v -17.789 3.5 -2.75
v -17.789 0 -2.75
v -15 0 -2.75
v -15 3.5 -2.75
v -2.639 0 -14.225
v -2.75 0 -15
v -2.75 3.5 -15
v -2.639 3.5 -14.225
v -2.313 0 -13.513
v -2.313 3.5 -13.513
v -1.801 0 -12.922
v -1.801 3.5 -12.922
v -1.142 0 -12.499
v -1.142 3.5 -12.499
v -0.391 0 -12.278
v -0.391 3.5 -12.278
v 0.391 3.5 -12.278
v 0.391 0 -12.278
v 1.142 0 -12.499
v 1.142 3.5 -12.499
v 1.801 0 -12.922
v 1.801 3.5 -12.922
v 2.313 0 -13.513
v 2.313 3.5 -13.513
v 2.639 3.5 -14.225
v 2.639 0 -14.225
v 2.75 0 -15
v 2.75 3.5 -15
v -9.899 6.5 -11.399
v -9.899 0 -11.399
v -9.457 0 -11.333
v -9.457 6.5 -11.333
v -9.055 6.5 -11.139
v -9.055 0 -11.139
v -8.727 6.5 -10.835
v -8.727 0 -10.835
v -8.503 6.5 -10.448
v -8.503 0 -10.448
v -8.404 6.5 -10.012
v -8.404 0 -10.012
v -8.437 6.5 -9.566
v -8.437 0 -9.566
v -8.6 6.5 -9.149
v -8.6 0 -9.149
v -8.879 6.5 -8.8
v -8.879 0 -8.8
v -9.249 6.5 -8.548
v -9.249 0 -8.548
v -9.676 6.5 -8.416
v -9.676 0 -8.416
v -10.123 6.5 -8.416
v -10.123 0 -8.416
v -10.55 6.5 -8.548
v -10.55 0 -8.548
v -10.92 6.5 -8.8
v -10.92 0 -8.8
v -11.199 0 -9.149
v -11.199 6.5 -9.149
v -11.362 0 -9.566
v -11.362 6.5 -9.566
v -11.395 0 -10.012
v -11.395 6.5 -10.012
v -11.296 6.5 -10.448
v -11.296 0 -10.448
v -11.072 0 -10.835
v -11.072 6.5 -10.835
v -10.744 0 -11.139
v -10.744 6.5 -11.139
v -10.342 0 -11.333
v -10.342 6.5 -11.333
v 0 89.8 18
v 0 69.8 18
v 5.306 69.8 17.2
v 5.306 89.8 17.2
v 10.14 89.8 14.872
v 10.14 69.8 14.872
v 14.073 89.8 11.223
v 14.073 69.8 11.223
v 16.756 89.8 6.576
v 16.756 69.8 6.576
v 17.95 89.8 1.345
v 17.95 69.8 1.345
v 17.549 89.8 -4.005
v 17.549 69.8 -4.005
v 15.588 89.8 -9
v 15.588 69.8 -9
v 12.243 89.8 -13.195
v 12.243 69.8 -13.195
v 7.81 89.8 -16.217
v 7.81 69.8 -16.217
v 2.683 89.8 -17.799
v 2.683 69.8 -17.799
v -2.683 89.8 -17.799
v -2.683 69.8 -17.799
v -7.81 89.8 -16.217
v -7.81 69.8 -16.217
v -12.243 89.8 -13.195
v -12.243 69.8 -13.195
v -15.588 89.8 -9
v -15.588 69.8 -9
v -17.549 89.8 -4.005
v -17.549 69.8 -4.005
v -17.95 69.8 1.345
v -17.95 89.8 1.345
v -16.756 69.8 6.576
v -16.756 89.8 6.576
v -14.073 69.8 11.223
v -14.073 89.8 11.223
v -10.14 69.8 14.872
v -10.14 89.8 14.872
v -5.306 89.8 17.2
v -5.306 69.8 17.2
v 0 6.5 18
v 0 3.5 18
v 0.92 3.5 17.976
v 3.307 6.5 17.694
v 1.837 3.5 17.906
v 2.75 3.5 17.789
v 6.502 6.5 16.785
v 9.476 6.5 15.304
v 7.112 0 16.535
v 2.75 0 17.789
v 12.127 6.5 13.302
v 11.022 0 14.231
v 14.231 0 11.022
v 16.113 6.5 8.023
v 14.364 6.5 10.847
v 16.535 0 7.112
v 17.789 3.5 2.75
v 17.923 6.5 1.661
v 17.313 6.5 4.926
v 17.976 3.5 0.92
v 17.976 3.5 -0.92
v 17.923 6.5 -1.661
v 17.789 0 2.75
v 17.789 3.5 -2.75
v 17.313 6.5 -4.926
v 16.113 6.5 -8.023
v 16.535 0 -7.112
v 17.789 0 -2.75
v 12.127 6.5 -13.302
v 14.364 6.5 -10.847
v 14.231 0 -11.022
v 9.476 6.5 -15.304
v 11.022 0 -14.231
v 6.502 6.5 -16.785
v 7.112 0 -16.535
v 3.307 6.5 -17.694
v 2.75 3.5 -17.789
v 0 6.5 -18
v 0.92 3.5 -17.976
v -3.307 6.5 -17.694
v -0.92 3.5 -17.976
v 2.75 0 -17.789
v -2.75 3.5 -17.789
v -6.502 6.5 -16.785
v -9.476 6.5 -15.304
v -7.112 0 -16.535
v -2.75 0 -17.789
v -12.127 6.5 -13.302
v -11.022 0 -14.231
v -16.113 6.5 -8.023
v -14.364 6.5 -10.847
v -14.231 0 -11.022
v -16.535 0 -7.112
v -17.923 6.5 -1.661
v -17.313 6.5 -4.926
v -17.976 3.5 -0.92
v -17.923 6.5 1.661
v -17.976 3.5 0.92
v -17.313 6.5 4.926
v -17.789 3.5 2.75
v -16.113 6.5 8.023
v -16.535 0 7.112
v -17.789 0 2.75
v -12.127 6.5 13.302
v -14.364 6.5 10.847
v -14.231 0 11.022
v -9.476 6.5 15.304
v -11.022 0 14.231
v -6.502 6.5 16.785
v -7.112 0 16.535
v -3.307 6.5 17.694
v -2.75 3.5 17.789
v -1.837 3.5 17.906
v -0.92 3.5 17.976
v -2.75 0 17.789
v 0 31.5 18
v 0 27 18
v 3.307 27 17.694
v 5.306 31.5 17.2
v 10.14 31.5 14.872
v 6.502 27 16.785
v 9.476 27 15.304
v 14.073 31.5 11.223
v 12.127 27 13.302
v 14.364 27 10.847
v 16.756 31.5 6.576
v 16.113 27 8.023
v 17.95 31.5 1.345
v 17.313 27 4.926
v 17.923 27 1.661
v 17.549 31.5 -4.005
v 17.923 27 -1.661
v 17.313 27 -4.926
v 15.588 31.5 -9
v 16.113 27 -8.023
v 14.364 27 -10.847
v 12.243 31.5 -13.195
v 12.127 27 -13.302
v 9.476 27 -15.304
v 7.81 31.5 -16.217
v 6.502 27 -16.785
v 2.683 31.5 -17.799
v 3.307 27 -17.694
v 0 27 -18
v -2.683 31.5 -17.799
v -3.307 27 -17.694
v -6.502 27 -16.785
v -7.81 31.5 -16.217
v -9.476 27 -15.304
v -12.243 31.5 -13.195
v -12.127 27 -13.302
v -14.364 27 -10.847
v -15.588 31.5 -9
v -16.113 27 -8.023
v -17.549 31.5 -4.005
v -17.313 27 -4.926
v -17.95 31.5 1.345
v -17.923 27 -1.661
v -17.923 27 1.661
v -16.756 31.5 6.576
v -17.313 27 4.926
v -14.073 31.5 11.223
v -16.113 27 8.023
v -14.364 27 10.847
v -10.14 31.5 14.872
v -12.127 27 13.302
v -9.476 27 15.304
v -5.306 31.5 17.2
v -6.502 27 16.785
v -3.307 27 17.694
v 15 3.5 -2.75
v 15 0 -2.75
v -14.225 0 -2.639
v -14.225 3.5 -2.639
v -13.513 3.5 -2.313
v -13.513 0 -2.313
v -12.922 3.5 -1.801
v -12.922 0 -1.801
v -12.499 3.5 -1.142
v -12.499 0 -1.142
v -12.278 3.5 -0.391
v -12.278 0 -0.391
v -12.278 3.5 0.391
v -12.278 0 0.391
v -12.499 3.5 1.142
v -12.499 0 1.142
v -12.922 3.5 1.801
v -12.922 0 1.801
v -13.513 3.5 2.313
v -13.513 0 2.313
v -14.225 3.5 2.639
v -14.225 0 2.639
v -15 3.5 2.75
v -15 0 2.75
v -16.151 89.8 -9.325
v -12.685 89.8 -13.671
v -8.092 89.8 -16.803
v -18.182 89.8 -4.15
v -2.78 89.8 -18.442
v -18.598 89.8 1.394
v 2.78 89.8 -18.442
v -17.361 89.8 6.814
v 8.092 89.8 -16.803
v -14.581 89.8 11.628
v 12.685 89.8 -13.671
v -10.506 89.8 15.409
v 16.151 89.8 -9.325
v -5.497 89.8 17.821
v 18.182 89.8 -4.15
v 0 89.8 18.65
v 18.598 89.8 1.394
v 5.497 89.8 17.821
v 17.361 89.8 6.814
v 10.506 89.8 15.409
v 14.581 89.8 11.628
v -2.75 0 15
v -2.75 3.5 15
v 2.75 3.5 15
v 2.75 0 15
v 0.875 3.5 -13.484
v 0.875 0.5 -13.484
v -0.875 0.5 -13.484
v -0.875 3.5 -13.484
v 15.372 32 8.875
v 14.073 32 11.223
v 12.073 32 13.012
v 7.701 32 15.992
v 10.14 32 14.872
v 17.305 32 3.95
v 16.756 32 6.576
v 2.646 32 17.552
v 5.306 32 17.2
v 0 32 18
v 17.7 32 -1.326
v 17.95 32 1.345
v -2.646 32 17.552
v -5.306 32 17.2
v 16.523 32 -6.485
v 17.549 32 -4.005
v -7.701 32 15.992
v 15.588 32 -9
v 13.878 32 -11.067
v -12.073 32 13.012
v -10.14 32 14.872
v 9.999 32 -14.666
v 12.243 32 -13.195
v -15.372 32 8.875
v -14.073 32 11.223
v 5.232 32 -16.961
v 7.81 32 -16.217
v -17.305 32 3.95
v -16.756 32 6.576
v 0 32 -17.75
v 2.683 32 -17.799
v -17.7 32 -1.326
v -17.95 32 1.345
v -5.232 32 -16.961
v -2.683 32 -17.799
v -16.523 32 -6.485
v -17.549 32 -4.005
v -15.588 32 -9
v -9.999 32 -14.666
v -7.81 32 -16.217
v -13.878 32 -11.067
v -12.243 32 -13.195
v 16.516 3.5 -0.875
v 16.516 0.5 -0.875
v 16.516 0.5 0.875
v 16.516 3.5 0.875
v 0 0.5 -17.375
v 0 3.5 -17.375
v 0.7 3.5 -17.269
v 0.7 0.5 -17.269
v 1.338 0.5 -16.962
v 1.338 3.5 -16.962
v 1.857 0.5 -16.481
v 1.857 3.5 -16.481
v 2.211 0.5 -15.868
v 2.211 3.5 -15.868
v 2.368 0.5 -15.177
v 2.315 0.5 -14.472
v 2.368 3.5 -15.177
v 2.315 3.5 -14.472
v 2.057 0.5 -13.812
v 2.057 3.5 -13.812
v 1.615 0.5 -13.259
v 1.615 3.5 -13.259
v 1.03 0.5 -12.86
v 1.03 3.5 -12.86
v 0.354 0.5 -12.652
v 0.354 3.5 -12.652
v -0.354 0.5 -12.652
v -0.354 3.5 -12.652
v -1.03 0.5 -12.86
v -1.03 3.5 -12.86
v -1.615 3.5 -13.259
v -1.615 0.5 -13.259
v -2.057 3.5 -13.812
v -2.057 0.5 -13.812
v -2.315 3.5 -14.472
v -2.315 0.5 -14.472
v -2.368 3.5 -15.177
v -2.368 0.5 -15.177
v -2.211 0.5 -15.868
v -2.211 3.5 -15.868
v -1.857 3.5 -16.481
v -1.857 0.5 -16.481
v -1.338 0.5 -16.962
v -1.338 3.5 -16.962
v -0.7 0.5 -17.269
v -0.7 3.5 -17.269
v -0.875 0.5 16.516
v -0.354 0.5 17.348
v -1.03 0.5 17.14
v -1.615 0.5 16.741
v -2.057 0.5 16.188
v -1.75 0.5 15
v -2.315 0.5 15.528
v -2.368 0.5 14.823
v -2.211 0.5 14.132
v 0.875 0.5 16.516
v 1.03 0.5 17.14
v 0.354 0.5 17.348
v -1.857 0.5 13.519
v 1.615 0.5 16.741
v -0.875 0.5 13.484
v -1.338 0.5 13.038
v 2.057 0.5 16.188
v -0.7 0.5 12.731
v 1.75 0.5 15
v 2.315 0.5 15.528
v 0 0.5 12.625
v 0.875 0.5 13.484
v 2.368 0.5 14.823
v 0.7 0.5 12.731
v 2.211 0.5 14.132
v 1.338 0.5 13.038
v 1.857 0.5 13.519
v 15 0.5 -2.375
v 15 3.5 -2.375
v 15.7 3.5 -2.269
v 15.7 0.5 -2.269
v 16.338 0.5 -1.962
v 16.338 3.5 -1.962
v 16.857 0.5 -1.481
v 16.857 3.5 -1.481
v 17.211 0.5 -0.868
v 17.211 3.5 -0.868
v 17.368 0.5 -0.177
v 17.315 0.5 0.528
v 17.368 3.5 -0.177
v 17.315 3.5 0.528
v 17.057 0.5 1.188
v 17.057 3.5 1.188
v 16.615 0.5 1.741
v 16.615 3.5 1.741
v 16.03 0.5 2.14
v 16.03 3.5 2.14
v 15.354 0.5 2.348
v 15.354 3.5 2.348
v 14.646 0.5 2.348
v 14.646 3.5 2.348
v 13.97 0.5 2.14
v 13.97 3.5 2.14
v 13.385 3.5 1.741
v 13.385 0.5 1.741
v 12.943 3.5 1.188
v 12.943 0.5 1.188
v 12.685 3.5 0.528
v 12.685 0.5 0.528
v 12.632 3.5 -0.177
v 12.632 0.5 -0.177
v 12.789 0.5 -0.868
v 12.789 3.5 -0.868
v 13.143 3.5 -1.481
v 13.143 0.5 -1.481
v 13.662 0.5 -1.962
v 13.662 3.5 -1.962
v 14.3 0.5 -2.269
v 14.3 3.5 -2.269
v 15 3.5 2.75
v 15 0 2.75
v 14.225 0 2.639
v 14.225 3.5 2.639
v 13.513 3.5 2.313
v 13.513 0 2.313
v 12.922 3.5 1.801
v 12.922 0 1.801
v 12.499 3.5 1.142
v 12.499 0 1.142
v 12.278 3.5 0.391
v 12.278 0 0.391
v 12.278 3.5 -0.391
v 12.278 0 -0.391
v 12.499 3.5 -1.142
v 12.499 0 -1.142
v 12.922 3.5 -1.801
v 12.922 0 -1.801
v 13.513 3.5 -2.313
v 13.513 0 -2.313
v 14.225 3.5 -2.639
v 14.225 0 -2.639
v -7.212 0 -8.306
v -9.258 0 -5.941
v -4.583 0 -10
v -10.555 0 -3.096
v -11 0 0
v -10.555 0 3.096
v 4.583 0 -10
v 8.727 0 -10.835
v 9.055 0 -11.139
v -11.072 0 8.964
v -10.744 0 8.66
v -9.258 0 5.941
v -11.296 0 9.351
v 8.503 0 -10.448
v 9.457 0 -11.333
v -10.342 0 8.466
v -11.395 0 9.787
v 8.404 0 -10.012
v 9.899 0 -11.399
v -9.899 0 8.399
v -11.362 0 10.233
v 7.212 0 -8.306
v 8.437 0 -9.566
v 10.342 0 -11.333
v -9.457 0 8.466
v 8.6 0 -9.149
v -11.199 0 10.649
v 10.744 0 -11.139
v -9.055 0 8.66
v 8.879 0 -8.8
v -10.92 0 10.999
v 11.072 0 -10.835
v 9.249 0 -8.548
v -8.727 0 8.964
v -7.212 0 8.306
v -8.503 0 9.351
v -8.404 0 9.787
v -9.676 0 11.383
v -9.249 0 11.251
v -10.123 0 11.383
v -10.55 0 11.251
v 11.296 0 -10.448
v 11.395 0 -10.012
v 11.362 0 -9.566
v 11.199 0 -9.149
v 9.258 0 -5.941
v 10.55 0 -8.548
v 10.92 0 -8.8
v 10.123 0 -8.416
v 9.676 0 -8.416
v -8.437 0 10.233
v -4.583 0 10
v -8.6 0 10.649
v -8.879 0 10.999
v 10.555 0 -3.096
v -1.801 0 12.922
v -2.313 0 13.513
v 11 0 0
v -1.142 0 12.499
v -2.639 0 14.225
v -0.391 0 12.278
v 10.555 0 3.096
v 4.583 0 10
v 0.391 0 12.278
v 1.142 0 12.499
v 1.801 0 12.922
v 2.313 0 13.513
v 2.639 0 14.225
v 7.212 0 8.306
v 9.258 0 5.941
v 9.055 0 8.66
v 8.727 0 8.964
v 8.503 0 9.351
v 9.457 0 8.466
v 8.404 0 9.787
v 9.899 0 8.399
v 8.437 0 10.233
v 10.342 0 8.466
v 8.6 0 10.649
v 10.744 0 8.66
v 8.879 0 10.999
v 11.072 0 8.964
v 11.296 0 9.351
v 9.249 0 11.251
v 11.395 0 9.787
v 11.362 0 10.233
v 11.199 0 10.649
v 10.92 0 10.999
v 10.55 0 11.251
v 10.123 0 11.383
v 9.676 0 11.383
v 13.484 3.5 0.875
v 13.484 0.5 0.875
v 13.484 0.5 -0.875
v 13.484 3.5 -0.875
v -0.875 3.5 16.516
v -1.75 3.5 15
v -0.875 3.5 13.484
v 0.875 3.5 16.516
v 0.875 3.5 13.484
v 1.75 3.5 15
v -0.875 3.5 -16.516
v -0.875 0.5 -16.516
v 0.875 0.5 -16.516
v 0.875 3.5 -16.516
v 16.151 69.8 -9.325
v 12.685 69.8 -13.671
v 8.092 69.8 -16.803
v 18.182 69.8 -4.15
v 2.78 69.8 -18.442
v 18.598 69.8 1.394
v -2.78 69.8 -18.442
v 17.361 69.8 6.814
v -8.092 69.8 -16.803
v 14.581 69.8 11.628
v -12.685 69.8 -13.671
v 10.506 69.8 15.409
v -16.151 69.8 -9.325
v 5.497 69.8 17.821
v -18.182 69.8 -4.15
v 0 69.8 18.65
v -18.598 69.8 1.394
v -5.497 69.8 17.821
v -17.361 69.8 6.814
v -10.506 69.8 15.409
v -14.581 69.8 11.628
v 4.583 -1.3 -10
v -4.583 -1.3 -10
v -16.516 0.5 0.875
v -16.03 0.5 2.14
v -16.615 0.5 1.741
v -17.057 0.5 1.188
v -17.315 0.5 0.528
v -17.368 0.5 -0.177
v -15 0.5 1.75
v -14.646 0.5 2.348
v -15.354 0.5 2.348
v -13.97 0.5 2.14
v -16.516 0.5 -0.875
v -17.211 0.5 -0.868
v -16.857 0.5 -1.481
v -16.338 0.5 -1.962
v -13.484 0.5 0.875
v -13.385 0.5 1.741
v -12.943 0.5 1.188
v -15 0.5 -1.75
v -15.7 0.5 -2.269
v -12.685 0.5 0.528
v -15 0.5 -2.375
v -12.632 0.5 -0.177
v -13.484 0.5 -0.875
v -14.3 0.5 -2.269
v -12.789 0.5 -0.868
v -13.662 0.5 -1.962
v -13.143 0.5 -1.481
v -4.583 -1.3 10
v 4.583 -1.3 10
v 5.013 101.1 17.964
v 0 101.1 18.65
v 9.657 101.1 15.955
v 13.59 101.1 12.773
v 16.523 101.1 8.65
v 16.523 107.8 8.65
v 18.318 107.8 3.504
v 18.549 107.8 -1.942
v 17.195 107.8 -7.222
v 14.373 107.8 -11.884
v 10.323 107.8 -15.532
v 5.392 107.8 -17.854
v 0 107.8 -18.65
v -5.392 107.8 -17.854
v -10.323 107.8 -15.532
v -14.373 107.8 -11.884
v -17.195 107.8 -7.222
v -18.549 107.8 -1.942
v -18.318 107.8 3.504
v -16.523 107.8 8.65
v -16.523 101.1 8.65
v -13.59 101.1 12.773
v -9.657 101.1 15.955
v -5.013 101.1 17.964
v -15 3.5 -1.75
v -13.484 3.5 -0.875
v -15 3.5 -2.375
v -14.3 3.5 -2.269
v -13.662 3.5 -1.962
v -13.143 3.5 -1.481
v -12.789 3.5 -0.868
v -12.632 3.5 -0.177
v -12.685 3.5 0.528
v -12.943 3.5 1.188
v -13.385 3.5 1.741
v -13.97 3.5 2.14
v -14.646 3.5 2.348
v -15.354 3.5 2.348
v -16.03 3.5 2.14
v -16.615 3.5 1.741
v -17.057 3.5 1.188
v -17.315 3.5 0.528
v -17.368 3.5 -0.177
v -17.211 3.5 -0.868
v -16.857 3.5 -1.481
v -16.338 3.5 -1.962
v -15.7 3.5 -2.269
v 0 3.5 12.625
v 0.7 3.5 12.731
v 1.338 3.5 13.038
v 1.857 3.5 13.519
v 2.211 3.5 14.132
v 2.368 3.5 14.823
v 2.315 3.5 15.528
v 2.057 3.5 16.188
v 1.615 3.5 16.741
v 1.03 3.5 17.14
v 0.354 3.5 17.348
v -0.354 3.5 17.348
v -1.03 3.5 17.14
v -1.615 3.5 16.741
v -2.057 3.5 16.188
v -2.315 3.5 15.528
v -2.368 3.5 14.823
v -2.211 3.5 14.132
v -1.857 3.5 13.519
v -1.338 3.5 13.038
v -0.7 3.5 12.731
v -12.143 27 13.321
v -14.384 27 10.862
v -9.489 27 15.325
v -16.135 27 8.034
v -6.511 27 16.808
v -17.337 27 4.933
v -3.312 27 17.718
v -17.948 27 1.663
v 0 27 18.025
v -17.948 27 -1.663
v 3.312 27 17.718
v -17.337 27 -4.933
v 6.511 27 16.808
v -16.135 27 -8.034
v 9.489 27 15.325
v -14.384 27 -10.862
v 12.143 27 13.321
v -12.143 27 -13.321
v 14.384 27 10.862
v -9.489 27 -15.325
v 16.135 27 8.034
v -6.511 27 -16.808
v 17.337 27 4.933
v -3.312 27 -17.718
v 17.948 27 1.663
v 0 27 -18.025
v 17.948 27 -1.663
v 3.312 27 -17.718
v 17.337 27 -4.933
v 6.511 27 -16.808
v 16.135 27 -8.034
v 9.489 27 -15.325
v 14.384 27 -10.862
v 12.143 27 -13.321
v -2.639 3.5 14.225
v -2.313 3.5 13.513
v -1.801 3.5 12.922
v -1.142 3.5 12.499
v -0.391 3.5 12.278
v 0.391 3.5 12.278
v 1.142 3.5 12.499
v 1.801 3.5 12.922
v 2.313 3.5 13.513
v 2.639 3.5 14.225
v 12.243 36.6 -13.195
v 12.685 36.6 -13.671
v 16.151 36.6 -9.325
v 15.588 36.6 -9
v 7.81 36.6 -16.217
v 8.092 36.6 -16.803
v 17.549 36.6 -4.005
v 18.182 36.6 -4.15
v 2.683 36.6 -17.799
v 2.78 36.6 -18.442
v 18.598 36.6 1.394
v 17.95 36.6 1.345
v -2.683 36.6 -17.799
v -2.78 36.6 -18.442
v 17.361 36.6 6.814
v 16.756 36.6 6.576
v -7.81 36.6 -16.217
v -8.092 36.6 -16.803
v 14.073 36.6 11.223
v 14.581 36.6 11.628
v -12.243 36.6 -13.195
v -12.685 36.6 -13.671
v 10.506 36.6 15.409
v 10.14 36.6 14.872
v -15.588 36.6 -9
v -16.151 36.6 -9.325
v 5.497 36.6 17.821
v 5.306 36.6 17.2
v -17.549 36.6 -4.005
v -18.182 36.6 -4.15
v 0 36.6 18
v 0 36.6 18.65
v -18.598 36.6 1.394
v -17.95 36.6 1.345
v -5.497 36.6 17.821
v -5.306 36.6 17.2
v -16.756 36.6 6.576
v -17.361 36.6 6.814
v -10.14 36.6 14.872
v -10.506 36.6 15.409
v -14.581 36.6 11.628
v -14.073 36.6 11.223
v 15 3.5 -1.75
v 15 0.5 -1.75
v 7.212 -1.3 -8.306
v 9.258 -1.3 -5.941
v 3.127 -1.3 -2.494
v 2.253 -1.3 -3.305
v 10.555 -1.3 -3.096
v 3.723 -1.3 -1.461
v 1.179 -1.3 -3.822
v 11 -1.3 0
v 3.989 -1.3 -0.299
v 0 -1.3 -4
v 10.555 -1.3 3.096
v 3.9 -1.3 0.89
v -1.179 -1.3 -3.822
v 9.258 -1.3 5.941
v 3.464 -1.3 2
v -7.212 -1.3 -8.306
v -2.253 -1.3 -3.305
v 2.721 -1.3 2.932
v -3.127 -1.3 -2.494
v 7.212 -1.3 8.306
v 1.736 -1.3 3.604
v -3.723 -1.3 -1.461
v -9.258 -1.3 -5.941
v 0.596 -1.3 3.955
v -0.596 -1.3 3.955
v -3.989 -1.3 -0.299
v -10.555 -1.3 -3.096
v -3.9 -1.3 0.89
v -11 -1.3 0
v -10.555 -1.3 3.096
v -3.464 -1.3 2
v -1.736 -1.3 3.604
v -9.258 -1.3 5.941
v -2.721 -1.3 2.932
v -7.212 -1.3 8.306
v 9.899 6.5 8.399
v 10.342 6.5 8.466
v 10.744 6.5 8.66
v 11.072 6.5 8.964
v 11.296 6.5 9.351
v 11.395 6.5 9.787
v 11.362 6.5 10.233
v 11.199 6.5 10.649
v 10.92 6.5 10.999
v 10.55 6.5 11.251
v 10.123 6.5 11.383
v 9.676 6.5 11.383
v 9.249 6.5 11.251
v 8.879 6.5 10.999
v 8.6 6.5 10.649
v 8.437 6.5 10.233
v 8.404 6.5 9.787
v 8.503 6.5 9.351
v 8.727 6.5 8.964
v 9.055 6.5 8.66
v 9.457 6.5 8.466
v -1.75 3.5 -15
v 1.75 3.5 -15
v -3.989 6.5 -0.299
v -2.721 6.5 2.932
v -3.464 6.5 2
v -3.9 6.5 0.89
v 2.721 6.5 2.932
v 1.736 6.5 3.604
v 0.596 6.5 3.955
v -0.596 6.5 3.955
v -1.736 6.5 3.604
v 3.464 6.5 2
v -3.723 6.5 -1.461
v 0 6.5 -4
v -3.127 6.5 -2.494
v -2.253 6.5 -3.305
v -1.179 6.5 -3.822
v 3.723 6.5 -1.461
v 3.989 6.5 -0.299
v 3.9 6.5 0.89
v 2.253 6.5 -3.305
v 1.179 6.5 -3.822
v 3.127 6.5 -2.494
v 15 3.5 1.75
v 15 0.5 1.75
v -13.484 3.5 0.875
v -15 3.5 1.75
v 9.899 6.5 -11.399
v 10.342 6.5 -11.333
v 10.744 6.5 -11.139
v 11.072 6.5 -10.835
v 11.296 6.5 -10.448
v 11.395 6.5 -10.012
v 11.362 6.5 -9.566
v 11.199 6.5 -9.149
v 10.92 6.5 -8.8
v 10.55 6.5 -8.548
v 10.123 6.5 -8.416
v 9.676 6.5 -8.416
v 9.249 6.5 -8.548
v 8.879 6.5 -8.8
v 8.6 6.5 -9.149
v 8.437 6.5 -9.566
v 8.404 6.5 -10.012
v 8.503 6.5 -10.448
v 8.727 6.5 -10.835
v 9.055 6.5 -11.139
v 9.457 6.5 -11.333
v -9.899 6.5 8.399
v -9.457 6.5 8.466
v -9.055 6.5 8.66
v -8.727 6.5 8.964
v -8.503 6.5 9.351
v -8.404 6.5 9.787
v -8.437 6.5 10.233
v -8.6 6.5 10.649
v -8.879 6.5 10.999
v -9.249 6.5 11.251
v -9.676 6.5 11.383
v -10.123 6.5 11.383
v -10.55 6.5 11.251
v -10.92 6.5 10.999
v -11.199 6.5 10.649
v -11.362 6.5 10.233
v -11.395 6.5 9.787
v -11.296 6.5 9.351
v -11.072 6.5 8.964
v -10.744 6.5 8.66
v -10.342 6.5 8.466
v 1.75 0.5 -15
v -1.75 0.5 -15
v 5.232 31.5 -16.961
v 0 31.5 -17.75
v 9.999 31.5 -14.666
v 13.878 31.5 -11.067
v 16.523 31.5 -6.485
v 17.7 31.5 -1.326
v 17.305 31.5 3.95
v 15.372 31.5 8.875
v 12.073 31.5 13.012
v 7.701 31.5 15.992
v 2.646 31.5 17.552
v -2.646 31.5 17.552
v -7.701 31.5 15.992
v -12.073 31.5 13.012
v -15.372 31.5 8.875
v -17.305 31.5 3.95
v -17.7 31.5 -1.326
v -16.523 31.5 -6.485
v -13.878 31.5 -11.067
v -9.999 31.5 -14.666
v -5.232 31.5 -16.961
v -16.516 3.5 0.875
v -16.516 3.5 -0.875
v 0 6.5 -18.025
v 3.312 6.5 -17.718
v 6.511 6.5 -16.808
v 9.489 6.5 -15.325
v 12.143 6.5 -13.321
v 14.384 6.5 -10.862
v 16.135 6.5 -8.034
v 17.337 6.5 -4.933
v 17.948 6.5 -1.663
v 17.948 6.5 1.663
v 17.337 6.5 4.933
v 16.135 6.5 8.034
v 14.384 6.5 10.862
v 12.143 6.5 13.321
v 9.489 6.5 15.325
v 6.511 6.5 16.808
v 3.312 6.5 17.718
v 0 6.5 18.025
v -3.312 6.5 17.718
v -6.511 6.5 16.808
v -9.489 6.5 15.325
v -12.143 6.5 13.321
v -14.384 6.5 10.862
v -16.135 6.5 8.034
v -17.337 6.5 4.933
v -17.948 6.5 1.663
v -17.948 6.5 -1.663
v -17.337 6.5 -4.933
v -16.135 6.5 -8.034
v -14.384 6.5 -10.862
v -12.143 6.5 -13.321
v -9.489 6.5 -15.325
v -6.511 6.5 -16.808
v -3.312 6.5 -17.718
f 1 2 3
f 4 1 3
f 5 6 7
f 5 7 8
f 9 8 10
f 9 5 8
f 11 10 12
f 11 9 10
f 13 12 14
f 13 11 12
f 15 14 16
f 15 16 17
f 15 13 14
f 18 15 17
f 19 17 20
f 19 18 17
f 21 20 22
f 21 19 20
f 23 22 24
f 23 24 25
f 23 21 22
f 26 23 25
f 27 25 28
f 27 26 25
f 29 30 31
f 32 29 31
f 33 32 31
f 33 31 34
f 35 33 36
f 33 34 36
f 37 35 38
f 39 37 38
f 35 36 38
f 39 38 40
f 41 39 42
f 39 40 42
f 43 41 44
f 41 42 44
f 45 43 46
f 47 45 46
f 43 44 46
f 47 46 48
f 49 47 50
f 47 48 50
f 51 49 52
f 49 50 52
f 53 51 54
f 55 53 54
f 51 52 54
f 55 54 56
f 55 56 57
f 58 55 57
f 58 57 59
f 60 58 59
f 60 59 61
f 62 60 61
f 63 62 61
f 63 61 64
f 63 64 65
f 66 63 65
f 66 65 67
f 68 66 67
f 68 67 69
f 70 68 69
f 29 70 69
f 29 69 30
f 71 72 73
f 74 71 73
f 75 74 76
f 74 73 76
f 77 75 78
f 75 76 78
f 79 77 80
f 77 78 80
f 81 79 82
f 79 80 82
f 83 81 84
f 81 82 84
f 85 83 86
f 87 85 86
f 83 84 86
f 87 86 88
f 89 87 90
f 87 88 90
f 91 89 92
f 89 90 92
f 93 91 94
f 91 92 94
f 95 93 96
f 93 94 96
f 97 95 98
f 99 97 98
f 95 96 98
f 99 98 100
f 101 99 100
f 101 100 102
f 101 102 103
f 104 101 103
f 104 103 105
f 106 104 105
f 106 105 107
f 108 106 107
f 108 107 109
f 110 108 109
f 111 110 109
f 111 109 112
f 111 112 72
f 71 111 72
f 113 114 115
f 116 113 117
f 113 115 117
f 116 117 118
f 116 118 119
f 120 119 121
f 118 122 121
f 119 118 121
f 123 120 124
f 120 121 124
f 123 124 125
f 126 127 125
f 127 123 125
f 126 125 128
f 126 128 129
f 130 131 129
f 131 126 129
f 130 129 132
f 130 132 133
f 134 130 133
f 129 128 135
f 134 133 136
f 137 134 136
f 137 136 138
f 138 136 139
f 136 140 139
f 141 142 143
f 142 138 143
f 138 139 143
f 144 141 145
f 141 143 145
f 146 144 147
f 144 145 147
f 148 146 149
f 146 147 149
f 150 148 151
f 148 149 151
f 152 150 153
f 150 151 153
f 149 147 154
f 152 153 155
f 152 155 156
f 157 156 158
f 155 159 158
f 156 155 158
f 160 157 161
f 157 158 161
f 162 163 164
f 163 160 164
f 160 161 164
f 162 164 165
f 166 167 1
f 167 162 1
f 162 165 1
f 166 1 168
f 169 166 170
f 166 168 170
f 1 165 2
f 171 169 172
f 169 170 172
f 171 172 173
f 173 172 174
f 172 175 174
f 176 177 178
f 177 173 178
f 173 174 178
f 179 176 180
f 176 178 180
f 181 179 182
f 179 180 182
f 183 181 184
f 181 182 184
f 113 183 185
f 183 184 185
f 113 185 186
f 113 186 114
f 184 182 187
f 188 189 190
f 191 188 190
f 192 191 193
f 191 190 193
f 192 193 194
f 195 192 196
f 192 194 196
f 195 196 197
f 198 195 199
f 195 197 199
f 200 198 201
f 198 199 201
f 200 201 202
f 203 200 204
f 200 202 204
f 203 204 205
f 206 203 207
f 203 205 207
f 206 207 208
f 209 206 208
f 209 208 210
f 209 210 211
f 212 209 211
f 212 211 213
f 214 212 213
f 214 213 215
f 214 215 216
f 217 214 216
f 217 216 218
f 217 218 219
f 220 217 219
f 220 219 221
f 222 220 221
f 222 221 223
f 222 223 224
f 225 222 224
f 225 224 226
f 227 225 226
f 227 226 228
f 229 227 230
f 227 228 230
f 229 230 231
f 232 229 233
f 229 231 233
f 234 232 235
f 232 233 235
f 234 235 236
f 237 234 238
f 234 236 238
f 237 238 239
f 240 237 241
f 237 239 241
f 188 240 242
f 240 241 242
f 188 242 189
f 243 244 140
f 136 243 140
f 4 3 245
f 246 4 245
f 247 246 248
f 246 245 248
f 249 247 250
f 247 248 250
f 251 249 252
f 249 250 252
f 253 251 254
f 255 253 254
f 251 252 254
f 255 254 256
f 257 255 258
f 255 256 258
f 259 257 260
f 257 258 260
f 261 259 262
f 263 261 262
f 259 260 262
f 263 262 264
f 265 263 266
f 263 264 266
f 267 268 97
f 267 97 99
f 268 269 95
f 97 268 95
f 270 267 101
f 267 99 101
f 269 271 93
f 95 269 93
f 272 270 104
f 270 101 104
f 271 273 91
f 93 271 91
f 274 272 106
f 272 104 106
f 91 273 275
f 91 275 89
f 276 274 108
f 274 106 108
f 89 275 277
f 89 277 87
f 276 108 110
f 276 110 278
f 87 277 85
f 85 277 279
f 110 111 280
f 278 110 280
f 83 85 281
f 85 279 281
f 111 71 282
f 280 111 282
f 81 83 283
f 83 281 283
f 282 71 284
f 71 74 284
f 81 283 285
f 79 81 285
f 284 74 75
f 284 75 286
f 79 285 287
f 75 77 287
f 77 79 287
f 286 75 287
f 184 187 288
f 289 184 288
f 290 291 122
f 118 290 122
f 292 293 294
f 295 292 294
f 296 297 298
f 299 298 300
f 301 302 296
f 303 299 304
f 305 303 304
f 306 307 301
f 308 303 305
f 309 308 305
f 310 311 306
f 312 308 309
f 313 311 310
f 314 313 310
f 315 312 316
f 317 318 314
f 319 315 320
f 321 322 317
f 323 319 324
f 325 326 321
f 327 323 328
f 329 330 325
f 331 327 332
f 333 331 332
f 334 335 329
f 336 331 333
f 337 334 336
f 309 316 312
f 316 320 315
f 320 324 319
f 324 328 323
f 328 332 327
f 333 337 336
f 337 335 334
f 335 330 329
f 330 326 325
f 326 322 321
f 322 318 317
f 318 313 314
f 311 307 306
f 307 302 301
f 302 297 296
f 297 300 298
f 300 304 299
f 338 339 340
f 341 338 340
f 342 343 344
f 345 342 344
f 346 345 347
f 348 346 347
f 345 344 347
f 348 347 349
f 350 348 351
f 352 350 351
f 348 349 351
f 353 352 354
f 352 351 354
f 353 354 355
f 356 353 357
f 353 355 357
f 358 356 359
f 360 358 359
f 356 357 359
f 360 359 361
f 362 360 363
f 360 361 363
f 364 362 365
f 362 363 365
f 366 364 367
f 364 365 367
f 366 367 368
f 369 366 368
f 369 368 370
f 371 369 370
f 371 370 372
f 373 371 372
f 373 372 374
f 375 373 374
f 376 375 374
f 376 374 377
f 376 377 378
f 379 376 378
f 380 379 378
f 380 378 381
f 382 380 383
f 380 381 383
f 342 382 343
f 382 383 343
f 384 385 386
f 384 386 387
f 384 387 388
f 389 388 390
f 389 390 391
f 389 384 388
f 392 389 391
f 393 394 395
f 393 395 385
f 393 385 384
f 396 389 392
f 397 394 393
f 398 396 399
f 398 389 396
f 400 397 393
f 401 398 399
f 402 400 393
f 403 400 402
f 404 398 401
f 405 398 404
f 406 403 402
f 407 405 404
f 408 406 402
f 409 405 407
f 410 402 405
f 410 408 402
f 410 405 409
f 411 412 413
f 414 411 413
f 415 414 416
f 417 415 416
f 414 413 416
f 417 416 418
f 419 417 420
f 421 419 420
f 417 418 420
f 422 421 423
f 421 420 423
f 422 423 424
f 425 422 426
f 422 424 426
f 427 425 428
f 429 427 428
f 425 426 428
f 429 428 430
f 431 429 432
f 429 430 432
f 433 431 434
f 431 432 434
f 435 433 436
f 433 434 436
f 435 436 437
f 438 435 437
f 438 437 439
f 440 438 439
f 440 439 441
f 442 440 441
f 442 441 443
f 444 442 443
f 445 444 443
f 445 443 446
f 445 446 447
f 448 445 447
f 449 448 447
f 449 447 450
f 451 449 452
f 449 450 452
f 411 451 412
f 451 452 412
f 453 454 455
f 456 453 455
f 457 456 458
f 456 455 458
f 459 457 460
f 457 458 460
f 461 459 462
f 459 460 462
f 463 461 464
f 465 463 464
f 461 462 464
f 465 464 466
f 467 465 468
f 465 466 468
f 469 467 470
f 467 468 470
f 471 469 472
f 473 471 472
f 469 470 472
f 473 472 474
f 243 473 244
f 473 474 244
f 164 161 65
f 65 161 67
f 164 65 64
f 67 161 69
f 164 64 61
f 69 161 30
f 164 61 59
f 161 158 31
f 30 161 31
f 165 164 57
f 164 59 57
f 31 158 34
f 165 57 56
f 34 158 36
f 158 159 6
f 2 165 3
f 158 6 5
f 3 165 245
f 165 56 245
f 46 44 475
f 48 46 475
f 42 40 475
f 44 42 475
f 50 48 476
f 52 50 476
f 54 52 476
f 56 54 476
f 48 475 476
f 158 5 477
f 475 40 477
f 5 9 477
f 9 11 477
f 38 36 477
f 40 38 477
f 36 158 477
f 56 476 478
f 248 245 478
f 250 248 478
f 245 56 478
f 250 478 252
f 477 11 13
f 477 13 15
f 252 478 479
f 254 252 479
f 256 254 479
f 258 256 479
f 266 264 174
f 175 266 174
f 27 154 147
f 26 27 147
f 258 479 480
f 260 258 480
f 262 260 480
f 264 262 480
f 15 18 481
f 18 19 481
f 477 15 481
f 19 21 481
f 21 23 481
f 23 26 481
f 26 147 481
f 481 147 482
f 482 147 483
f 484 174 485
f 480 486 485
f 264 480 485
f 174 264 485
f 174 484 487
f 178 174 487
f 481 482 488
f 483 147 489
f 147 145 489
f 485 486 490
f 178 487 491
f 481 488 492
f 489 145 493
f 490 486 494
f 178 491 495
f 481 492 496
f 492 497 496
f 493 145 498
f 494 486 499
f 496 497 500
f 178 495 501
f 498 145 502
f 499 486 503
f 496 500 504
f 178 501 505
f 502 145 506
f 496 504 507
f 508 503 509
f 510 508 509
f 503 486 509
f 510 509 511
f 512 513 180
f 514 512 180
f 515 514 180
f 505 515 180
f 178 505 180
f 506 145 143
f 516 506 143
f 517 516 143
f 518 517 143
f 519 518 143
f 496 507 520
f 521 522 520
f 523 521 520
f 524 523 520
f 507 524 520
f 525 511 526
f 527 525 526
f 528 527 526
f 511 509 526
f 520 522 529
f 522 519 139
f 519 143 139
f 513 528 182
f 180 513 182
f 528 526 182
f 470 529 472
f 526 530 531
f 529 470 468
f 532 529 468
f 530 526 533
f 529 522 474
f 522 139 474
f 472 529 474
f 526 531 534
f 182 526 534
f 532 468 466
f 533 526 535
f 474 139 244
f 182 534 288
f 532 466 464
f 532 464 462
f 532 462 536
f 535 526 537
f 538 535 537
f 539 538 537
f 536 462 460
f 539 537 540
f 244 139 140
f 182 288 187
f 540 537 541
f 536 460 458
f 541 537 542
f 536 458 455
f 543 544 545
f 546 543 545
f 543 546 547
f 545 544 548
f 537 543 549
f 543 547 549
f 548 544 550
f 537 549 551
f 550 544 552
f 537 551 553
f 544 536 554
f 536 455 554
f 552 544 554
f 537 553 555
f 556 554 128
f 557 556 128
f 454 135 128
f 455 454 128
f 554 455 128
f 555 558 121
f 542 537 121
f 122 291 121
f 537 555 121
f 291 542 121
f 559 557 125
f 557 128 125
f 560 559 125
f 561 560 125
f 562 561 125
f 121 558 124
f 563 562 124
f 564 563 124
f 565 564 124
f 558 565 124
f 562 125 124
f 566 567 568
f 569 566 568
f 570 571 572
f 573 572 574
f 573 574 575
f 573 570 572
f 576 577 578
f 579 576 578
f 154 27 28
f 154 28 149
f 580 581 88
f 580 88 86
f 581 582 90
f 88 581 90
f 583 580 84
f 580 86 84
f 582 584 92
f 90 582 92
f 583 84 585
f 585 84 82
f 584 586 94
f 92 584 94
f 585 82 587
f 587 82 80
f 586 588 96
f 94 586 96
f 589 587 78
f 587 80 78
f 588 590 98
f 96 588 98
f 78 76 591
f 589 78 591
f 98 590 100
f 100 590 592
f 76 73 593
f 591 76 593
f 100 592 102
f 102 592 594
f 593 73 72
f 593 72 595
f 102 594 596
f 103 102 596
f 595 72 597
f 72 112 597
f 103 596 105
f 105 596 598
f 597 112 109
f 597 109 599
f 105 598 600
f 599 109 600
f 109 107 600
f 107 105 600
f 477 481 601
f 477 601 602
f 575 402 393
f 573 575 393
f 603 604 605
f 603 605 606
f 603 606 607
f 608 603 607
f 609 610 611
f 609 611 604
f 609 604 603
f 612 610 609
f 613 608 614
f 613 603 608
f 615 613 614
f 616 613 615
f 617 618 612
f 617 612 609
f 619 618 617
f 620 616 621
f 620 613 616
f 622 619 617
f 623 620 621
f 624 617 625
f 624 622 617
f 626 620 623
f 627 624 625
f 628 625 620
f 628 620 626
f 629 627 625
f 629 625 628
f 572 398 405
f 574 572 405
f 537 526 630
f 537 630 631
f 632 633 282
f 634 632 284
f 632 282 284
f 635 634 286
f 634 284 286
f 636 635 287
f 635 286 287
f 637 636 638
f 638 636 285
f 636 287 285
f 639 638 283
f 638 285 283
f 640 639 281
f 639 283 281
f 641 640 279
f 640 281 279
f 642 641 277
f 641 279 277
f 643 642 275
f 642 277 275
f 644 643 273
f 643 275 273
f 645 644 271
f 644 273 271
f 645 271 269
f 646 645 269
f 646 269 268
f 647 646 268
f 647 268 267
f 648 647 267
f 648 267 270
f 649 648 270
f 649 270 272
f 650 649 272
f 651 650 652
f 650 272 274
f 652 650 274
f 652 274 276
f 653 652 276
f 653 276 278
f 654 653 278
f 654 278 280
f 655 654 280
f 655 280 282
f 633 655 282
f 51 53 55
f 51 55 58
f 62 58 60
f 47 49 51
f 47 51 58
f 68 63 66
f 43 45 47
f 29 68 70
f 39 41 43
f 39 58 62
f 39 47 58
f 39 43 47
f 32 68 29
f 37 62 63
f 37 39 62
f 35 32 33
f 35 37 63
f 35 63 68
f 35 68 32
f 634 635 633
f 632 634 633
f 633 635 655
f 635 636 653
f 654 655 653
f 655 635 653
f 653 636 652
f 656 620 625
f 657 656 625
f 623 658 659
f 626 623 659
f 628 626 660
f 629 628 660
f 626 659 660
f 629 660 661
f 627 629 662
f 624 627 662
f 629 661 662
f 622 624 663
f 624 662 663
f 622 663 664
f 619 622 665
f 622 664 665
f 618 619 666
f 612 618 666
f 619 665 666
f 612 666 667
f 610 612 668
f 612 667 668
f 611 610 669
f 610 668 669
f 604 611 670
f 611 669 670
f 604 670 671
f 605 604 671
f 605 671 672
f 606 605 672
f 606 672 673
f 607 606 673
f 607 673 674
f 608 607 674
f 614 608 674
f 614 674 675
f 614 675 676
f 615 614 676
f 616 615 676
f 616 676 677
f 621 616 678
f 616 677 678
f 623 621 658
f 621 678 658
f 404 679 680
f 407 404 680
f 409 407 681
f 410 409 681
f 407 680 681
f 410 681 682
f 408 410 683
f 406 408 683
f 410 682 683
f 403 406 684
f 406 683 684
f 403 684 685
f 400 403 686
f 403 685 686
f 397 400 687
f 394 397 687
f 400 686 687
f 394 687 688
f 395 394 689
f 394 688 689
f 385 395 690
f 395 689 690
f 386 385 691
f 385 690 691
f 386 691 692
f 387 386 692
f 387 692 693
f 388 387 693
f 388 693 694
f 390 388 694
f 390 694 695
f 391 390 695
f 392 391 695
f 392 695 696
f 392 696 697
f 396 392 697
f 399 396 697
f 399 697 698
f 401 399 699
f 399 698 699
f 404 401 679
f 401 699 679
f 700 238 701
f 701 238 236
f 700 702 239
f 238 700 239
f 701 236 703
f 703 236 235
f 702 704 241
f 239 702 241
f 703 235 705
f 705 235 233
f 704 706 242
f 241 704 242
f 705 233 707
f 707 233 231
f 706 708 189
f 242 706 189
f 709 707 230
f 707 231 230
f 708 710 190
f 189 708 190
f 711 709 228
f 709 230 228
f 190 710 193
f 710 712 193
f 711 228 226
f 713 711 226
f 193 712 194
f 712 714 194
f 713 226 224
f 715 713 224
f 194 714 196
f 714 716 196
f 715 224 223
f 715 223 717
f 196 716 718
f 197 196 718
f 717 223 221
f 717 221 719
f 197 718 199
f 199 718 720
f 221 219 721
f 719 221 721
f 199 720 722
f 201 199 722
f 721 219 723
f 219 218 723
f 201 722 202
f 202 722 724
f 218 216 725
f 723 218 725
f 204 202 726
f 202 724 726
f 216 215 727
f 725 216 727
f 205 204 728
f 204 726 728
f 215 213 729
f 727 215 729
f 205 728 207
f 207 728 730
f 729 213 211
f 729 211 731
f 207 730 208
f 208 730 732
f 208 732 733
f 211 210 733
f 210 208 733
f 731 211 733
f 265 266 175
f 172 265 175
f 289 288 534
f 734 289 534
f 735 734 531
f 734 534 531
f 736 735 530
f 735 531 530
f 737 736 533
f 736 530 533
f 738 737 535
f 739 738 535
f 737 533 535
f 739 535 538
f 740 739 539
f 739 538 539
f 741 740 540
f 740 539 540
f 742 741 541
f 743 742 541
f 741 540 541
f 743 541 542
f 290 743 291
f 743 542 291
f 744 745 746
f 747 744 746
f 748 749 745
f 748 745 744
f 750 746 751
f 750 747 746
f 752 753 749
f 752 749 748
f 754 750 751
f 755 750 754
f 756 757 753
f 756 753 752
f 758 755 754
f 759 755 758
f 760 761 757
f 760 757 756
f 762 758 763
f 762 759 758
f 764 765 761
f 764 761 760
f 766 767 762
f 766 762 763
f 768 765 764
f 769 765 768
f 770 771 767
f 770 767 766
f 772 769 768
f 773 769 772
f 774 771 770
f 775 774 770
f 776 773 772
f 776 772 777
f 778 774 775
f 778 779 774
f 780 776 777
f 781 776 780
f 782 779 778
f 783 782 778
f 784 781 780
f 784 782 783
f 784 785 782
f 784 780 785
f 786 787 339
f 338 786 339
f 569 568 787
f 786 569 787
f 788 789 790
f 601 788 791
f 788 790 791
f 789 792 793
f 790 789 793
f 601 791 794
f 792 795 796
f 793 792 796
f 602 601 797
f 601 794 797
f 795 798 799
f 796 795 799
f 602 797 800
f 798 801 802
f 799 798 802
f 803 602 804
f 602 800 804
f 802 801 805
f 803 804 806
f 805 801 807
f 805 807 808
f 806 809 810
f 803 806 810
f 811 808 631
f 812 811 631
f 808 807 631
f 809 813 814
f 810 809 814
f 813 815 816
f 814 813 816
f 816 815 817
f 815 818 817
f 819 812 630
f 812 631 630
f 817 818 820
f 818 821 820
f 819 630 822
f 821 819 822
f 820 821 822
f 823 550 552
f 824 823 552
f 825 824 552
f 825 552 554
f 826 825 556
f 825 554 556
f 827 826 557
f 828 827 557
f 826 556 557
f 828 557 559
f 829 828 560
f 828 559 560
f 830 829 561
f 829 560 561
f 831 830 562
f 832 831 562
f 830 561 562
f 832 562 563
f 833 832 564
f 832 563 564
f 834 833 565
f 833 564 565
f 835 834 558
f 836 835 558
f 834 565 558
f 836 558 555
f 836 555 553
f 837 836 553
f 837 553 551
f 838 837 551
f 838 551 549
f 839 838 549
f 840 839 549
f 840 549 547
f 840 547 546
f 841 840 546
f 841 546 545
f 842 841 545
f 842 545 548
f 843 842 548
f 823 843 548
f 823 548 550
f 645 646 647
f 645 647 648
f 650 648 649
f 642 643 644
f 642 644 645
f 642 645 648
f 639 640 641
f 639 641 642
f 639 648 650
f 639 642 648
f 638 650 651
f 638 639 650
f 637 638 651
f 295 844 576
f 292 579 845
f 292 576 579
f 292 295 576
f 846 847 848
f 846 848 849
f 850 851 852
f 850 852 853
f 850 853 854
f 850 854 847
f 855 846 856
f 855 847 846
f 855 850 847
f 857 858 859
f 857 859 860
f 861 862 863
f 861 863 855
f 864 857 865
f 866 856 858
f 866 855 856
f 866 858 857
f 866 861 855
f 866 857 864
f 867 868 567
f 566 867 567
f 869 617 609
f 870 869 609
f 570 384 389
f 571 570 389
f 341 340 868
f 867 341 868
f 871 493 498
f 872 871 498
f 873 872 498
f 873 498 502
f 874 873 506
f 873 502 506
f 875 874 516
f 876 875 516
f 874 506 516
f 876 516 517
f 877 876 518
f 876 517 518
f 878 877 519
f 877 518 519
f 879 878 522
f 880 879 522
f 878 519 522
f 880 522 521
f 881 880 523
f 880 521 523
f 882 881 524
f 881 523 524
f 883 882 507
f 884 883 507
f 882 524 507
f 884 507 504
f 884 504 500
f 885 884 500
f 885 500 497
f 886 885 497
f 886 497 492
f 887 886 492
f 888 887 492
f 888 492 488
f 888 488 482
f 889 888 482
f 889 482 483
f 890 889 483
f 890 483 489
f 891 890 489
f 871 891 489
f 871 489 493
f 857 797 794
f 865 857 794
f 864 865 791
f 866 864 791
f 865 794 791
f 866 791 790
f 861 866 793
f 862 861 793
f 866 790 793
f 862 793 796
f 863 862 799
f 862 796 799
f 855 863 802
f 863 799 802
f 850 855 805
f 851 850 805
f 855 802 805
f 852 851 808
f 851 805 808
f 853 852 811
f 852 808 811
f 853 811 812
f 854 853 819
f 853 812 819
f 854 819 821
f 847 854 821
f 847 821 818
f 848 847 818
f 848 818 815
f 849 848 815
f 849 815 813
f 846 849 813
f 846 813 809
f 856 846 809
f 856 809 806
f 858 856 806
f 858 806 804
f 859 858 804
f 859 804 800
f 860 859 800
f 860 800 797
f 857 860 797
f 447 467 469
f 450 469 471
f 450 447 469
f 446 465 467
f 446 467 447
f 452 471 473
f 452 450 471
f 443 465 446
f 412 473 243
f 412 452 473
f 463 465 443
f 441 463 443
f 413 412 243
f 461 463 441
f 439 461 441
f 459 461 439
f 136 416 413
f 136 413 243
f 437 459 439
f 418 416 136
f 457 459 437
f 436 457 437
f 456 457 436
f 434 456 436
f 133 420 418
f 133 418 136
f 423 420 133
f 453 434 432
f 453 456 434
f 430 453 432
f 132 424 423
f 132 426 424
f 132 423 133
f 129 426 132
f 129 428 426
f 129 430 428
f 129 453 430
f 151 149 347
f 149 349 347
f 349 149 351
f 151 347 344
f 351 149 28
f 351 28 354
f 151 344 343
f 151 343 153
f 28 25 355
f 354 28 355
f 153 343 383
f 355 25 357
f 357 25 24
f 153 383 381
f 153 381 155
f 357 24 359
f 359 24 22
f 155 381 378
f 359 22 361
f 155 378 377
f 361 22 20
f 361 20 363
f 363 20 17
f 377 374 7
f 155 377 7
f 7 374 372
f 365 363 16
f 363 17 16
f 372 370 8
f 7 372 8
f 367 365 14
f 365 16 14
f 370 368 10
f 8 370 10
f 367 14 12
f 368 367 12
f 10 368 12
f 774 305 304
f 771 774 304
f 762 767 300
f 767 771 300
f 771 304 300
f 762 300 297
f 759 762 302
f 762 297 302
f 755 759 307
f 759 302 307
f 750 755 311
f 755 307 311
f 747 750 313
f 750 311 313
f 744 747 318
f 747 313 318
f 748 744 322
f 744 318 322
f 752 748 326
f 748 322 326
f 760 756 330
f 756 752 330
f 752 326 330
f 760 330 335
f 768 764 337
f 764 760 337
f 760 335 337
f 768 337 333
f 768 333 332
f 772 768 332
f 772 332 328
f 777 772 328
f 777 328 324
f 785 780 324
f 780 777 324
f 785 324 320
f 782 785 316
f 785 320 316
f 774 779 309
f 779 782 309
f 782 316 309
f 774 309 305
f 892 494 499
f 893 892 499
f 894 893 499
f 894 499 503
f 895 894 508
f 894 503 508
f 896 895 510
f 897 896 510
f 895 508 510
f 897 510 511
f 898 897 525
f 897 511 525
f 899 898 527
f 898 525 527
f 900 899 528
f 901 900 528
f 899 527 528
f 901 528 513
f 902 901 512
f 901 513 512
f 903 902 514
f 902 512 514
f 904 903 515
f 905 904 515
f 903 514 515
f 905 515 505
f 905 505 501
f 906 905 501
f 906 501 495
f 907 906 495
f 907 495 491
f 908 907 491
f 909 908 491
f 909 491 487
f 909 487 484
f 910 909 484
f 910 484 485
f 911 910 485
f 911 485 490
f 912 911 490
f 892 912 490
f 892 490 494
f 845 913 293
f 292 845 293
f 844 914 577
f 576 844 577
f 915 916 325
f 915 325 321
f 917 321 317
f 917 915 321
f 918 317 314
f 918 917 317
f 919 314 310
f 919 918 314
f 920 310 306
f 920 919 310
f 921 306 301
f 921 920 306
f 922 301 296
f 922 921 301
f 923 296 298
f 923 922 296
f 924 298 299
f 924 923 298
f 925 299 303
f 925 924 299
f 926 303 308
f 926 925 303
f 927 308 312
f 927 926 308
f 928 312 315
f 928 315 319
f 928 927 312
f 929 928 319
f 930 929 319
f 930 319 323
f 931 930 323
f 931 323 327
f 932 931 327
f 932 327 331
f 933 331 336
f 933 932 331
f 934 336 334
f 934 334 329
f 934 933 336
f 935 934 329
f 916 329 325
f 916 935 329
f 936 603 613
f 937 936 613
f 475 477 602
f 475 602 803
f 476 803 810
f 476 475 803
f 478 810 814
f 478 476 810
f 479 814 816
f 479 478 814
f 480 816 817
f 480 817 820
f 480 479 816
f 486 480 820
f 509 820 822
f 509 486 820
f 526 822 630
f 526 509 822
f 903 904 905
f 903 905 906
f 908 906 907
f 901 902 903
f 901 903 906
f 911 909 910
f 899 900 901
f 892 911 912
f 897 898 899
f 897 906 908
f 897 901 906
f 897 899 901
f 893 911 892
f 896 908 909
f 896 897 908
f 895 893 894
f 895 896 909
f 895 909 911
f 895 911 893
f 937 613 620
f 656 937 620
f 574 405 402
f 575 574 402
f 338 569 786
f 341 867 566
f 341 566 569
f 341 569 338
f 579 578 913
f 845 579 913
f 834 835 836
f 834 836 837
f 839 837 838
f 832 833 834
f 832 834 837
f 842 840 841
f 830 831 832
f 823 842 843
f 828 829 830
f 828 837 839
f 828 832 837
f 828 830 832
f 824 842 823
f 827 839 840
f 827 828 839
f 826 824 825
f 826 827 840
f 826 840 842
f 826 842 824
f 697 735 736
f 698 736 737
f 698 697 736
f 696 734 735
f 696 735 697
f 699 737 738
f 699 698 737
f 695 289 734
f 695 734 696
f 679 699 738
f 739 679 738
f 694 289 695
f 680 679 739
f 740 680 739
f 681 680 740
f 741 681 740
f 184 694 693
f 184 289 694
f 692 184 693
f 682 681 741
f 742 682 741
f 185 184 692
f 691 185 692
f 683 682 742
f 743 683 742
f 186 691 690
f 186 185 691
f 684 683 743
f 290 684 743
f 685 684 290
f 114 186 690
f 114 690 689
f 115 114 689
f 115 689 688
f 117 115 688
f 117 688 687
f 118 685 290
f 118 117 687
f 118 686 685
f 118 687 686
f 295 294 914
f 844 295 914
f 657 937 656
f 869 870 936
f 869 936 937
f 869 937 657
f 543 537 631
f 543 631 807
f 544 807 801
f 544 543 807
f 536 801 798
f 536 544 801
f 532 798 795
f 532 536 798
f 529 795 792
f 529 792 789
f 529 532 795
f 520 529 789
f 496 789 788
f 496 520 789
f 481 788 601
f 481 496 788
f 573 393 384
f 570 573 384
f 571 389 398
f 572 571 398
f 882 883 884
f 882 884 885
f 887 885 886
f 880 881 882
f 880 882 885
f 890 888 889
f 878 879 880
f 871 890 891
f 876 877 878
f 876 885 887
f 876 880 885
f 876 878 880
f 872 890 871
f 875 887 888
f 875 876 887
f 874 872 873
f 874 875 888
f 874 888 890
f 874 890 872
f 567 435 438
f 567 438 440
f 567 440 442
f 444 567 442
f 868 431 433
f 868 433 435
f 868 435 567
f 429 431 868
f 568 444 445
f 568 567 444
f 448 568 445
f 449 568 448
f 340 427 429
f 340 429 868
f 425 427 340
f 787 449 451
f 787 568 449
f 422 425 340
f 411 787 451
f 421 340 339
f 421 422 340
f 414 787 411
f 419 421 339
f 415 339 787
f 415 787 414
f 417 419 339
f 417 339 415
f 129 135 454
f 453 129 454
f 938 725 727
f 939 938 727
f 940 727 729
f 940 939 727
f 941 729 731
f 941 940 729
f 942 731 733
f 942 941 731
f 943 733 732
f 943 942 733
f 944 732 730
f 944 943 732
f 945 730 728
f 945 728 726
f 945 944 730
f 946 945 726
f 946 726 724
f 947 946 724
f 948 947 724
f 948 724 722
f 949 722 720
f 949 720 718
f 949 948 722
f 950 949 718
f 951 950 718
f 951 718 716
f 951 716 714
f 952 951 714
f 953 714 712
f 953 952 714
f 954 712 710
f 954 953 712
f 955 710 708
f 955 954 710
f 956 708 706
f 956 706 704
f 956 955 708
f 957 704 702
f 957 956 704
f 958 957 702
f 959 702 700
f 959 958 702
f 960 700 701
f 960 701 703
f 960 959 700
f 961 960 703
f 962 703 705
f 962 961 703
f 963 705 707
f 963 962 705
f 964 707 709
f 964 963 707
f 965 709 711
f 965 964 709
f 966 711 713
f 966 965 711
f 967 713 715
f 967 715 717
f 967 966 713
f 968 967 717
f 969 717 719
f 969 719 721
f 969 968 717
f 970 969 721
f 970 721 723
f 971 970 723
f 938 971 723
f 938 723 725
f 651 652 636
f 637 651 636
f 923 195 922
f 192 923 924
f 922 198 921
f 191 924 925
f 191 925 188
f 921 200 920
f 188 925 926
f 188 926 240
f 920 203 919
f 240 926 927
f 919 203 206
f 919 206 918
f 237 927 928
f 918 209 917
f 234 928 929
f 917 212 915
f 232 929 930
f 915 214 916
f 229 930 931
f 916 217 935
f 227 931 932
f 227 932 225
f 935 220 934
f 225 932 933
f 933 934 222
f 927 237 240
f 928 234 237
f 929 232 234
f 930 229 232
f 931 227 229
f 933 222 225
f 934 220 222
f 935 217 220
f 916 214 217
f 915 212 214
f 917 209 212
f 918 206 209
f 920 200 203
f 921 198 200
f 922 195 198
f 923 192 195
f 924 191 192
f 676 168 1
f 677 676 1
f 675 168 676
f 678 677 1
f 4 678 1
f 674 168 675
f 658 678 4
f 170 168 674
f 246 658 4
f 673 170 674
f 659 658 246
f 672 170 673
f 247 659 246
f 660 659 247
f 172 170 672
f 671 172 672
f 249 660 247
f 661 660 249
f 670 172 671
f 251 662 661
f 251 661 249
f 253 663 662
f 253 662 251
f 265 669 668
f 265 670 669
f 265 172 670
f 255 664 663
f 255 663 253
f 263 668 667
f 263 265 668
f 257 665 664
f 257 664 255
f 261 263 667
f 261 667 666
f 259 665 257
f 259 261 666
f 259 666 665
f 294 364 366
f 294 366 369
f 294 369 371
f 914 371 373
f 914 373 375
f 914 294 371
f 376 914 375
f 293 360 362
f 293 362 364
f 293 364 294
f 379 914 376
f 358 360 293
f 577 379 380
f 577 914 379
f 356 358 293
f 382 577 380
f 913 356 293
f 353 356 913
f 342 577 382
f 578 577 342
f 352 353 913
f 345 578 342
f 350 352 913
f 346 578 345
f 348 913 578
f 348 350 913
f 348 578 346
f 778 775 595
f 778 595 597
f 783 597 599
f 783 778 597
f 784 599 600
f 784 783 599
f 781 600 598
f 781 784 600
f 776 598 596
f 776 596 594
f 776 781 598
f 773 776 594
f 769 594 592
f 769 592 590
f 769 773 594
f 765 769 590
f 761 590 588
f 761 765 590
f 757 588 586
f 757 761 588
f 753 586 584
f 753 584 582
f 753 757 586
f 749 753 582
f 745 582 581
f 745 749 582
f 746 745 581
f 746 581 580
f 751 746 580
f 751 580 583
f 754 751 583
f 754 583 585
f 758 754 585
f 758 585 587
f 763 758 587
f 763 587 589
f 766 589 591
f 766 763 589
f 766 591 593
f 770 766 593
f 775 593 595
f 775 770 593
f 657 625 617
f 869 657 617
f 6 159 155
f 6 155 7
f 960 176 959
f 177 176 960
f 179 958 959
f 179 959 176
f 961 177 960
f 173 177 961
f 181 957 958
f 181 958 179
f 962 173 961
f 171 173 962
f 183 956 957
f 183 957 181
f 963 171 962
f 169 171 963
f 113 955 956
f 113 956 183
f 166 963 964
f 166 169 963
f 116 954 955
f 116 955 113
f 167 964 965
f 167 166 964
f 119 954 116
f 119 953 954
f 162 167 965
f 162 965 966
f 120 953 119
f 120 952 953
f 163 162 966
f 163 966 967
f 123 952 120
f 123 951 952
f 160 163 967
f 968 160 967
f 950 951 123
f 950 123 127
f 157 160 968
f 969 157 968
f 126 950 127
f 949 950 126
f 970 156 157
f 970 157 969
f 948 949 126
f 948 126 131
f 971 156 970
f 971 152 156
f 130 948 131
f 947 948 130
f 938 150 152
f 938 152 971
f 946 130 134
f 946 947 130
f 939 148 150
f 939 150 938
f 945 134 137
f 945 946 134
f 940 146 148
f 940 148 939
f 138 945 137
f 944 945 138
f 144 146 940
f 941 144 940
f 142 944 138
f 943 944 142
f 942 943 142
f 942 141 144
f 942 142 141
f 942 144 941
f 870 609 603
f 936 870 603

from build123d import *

# Parameters (mm, degrees)
SKETCH1_R           = 18
BOSS_EXTRUDE1_DEPTH = 89.8
SKETCH2_R           = 18.65
BOSS_EXTRUDE2_DEPTH = 18
BOSS_EXTRUDE4_DEPTH = 1.3
BOSS_EXTRUDE3_START = 33.2
SKETCH3_R           = 18.65
BOSS_EXTRUDE3_DEPTH = 33.2
SKETCH11_R          = 4
CUT_EXTRUDE1_DEPTH  = 10.3
CUT_EXTRUDE2_START  = -6.7
CUT_EXTRUDE2_DEPTH  = 6.7
SKETCH14_R          = 1.5
CUT_EXTRUDE3_DEPTH  = 10
SKETCH16_R          = 18.025
BOSS_EXTRUDE5_DEPTH = 20.5
SKETCH17_R          = 19.645678417
SKETCH17_R_2        = 17.75
CUT_EXTRUDE5_DEPTH  = 0.5
CUT_EXTRUDE6_DEPTH  = 3.5
SKETCH19_R          = 2.375
BOSS_EXTRUDE6_DEPTH = 3
CUT_EXTRUDE7_DEPTH  = 3


with BuildPart() as part:
    # Sketch1 → Boss-Extrude1 (new body)
    with BuildSketch(Plane(origin=(0, 0, 0), x_dir=(1, 0, 0), z_dir=(0, 1, 0))):
        with Locations(Location((0, 0, 0), (0, 0, 270))):
            Circle(SKETCH1_R)
    extrude(amount=BOSS_EXTRUDE1_DEPTH)

    # Sketch2 → Boss-Extrude2 (add)
    with BuildSketch(Plane(origin=(0, 89.8, 0), x_dir=(1, 0, 0), z_dir=(0, 1, 0))):
        with Locations(Location((0, 0, 0), (0, 0, 270))):
            Circle(SKETCH2_R)
    extrude(amount=BOSS_EXTRUDE2_DEPTH)

    # Sketch9 → Boss-Extrude4 (add)
    with BuildSketch(Plane.XZ):
        with BuildLine():
            Line((4.582575695, -10), (-4.582575695, -10))
            ThreePointArc((-4.582575695, -10), (-11, 0), (-4.582575695, 10))
            Line((-4.582575695, 10), (4.582575695, 10))
            ThreePointArc((4.582575695, 10), (11, 0), (4.582575695, -10))
        make_face()
    extrude(amount=BOSS_EXTRUDE4_DEPTH)

    # Sketch3 → Boss-Extrude3 (add)
    with BuildSketch(Plane(origin=(0, 69.8, 0), x_dir=(-1, 0, 0), z_dir=(0, -1, 0)).offset(BOSS_EXTRUDE3_START)):
        with Locations(Location((0, 0, 0), (0, 0, 270))):
            Circle(SKETCH3_R)
    extrude(amount=-BOSS_EXTRUDE3_DEPTH)

    # Sketch11 → Cut-Extrude1 (cut)
    with BuildSketch(Plane.XZ.offset(1.3)):
        with Locations(Location((0, 0, 0), (0, 0, 270))):
            Circle(SKETCH11_R)
    extrude(amount=-CUT_EXTRUDE1_DEPTH, mode=Mode.SUBTRACT)

    # Sketch13 → Cut-Extrude2 (cut)
    with BuildSketch(Plane(origin=(0, 107.8, 0), x_dir=(1, 0, 0), z_dir=(0, 1, 0)).offset(CUT_EXTRUDE2_START)):
        with BuildLine():
            Line((-16.522711642, -8.65), (16.522711642, -8.65))
            ThreePointArc((16.522711642, -8.65), (0, -18.65), (-16.522711642, -8.65))
        make_face()
    extrude(amount=CUT_EXTRUDE2_DEPTH, mode=Mode.SUBTRACT)

    # Sketch14 → Cut-Extrude3 (cut)
    with BuildSketch(Plane.XZ):
        with Locations(Location((-9.899494937, 9.899494937, 0), (0, 0, 270))):
            Circle(SKETCH14_R)
        with Locations(Location((9.899494937, 9.899494937, 0), (0, 0, 270))):
            Circle(SKETCH14_R)
        with Locations(Location((9.899494937, -9.899494937, 0), (0, 0, 270))):
            Circle(SKETCH14_R)
        with Locations(Location((-9.899494937, -9.899494937, 0), (0, 0, 270))):
            Circle(SKETCH14_R)
    extrude(amount=-CUT_EXTRUDE3_DEPTH, mode=Mode.SUBTRACT)

    # Sketch16 → Boss-Extrude5 (add)
    with BuildSketch(Plane(origin=(0, 6.5, 0), x_dir=(-1, 0, 0), z_dir=(0, -1, 0))):
        with Locations(Location((0, 0, 0), (0, 0, 90))):
            Circle(SKETCH16_R)
    extrude(amount=-BOSS_EXTRUDE5_DEPTH)

    # Sketch17 → Cut-Extrude5 (cut)
    with BuildSketch(Plane(origin=(0, 31.5, 0), x_dir=(-1, 0, 0), z_dir=(0, -1, 0))):
        Circle(SKETCH17_R)
        with Locations(Location((0, 0, 0), (0, 0, 90))):
            Circle(SKETCH17_R_2, mode=Mode.SUBTRACT)
    extrude(amount=-CUT_EXTRUDE5_DEPTH, mode=Mode.SUBTRACT)

    # Sketch18 → Cut-Extrude6 (cut)
    with BuildSketch(Plane.XZ):
        with BuildLine():
            Line((2.75, -15), (2.75, -20))
            Line((2.75, -20), (-2.75, -20))
            Line((-2.75, -20), (-2.75, -15))
            ThreePointArc((-2.75, -15), (0, -12.25), (2.75, -15))
        make_face()
        with BuildLine():
            Line((2.75, 15), (2.75, 20))
            Line((2.75, 20), (-2.75, 20))
            Line((-2.75, 20), (-2.75, 15))
            ThreePointArc((-2.75, 15), (0, 12.25), (2.75, 15))
        make_face()
        with BuildLine():
            Line((-15, 2.75), (-20, 2.75))
            Line((-20, 2.75), (-20, -2.75))
            Line((-20, -2.75), (-15, -2.75))
            ThreePointArc((-15, -2.75), (-12.25, 0), (-15, 2.75))
        make_face()
        with BuildLine():
            Line((15, -2.75), (20, -2.75))
            Line((20, -2.75), (20, 2.75))
            Line((20, 2.75), (15, 2.75))
            ThreePointArc((15, 2.75), (12.25, 0), (15, -2.75))
        make_face()
    extrude(amount=-CUT_EXTRUDE6_DEPTH, mode=Mode.SUBTRACT)

    # Sketch19 → Boss-Extrude6 (add)
    with BuildSketch(Plane.XZ.offset(-3.5)):
        with Locations(Location((-15, 0, 0), (0, 0, 270))):
            Circle(SKETCH19_R)
        with Locations(Location((0, 15, 0), (0, 0, 270))):
            Circle(SKETCH19_R)
        with Locations(Location((15, 0, 0), (0, 0, 270))):
            Circle(SKETCH19_R)
        with Locations(Location((0, -15, 0), (0, 0, 270))):
            Circle(SKETCH19_R)
    extrude(amount=BOSS_EXTRUDE6_DEPTH)

    # Sketch20 → Cut-Extrude7 (cut)
    with BuildSketch(Plane.XZ.offset(-0.5)):
        Polygon((16.515813069, 0.875155083), (15, 1.750310167), (13.484186931, 0.875155083), (13.484186931, -0.875155083), (15, -1.750310167), (16.515813069, -0.875155083), align=None)
        Polygon((-1.750310167, 15), (-0.875155083, 13.484186931), (0.875155083, 13.484186931), (1.750310167, 15), (0.875155083, 16.515813069), (-0.875155083, 16.515813069), align=None)
        Polygon((0.875155083, -16.515813069), (1.750310167, -15), (0.875155083, -13.484186931), (-0.875155083, -13.484186931), (-1.750310167, -15), (-0.875155083, -16.515813069), align=None)
        Polygon((-16.515813069, -0.875155083), (-15, -1.750310167), (-13.484186931, -0.875155083), (-13.484186931, 0.875155083), (-15, 1.750310167), (-16.515813069, 0.875155083), align=None)
    extrude(amount=-CUT_EXTRUDE7_DEPTH, mode=Mode.SUBTRACT)


solid = part.part
